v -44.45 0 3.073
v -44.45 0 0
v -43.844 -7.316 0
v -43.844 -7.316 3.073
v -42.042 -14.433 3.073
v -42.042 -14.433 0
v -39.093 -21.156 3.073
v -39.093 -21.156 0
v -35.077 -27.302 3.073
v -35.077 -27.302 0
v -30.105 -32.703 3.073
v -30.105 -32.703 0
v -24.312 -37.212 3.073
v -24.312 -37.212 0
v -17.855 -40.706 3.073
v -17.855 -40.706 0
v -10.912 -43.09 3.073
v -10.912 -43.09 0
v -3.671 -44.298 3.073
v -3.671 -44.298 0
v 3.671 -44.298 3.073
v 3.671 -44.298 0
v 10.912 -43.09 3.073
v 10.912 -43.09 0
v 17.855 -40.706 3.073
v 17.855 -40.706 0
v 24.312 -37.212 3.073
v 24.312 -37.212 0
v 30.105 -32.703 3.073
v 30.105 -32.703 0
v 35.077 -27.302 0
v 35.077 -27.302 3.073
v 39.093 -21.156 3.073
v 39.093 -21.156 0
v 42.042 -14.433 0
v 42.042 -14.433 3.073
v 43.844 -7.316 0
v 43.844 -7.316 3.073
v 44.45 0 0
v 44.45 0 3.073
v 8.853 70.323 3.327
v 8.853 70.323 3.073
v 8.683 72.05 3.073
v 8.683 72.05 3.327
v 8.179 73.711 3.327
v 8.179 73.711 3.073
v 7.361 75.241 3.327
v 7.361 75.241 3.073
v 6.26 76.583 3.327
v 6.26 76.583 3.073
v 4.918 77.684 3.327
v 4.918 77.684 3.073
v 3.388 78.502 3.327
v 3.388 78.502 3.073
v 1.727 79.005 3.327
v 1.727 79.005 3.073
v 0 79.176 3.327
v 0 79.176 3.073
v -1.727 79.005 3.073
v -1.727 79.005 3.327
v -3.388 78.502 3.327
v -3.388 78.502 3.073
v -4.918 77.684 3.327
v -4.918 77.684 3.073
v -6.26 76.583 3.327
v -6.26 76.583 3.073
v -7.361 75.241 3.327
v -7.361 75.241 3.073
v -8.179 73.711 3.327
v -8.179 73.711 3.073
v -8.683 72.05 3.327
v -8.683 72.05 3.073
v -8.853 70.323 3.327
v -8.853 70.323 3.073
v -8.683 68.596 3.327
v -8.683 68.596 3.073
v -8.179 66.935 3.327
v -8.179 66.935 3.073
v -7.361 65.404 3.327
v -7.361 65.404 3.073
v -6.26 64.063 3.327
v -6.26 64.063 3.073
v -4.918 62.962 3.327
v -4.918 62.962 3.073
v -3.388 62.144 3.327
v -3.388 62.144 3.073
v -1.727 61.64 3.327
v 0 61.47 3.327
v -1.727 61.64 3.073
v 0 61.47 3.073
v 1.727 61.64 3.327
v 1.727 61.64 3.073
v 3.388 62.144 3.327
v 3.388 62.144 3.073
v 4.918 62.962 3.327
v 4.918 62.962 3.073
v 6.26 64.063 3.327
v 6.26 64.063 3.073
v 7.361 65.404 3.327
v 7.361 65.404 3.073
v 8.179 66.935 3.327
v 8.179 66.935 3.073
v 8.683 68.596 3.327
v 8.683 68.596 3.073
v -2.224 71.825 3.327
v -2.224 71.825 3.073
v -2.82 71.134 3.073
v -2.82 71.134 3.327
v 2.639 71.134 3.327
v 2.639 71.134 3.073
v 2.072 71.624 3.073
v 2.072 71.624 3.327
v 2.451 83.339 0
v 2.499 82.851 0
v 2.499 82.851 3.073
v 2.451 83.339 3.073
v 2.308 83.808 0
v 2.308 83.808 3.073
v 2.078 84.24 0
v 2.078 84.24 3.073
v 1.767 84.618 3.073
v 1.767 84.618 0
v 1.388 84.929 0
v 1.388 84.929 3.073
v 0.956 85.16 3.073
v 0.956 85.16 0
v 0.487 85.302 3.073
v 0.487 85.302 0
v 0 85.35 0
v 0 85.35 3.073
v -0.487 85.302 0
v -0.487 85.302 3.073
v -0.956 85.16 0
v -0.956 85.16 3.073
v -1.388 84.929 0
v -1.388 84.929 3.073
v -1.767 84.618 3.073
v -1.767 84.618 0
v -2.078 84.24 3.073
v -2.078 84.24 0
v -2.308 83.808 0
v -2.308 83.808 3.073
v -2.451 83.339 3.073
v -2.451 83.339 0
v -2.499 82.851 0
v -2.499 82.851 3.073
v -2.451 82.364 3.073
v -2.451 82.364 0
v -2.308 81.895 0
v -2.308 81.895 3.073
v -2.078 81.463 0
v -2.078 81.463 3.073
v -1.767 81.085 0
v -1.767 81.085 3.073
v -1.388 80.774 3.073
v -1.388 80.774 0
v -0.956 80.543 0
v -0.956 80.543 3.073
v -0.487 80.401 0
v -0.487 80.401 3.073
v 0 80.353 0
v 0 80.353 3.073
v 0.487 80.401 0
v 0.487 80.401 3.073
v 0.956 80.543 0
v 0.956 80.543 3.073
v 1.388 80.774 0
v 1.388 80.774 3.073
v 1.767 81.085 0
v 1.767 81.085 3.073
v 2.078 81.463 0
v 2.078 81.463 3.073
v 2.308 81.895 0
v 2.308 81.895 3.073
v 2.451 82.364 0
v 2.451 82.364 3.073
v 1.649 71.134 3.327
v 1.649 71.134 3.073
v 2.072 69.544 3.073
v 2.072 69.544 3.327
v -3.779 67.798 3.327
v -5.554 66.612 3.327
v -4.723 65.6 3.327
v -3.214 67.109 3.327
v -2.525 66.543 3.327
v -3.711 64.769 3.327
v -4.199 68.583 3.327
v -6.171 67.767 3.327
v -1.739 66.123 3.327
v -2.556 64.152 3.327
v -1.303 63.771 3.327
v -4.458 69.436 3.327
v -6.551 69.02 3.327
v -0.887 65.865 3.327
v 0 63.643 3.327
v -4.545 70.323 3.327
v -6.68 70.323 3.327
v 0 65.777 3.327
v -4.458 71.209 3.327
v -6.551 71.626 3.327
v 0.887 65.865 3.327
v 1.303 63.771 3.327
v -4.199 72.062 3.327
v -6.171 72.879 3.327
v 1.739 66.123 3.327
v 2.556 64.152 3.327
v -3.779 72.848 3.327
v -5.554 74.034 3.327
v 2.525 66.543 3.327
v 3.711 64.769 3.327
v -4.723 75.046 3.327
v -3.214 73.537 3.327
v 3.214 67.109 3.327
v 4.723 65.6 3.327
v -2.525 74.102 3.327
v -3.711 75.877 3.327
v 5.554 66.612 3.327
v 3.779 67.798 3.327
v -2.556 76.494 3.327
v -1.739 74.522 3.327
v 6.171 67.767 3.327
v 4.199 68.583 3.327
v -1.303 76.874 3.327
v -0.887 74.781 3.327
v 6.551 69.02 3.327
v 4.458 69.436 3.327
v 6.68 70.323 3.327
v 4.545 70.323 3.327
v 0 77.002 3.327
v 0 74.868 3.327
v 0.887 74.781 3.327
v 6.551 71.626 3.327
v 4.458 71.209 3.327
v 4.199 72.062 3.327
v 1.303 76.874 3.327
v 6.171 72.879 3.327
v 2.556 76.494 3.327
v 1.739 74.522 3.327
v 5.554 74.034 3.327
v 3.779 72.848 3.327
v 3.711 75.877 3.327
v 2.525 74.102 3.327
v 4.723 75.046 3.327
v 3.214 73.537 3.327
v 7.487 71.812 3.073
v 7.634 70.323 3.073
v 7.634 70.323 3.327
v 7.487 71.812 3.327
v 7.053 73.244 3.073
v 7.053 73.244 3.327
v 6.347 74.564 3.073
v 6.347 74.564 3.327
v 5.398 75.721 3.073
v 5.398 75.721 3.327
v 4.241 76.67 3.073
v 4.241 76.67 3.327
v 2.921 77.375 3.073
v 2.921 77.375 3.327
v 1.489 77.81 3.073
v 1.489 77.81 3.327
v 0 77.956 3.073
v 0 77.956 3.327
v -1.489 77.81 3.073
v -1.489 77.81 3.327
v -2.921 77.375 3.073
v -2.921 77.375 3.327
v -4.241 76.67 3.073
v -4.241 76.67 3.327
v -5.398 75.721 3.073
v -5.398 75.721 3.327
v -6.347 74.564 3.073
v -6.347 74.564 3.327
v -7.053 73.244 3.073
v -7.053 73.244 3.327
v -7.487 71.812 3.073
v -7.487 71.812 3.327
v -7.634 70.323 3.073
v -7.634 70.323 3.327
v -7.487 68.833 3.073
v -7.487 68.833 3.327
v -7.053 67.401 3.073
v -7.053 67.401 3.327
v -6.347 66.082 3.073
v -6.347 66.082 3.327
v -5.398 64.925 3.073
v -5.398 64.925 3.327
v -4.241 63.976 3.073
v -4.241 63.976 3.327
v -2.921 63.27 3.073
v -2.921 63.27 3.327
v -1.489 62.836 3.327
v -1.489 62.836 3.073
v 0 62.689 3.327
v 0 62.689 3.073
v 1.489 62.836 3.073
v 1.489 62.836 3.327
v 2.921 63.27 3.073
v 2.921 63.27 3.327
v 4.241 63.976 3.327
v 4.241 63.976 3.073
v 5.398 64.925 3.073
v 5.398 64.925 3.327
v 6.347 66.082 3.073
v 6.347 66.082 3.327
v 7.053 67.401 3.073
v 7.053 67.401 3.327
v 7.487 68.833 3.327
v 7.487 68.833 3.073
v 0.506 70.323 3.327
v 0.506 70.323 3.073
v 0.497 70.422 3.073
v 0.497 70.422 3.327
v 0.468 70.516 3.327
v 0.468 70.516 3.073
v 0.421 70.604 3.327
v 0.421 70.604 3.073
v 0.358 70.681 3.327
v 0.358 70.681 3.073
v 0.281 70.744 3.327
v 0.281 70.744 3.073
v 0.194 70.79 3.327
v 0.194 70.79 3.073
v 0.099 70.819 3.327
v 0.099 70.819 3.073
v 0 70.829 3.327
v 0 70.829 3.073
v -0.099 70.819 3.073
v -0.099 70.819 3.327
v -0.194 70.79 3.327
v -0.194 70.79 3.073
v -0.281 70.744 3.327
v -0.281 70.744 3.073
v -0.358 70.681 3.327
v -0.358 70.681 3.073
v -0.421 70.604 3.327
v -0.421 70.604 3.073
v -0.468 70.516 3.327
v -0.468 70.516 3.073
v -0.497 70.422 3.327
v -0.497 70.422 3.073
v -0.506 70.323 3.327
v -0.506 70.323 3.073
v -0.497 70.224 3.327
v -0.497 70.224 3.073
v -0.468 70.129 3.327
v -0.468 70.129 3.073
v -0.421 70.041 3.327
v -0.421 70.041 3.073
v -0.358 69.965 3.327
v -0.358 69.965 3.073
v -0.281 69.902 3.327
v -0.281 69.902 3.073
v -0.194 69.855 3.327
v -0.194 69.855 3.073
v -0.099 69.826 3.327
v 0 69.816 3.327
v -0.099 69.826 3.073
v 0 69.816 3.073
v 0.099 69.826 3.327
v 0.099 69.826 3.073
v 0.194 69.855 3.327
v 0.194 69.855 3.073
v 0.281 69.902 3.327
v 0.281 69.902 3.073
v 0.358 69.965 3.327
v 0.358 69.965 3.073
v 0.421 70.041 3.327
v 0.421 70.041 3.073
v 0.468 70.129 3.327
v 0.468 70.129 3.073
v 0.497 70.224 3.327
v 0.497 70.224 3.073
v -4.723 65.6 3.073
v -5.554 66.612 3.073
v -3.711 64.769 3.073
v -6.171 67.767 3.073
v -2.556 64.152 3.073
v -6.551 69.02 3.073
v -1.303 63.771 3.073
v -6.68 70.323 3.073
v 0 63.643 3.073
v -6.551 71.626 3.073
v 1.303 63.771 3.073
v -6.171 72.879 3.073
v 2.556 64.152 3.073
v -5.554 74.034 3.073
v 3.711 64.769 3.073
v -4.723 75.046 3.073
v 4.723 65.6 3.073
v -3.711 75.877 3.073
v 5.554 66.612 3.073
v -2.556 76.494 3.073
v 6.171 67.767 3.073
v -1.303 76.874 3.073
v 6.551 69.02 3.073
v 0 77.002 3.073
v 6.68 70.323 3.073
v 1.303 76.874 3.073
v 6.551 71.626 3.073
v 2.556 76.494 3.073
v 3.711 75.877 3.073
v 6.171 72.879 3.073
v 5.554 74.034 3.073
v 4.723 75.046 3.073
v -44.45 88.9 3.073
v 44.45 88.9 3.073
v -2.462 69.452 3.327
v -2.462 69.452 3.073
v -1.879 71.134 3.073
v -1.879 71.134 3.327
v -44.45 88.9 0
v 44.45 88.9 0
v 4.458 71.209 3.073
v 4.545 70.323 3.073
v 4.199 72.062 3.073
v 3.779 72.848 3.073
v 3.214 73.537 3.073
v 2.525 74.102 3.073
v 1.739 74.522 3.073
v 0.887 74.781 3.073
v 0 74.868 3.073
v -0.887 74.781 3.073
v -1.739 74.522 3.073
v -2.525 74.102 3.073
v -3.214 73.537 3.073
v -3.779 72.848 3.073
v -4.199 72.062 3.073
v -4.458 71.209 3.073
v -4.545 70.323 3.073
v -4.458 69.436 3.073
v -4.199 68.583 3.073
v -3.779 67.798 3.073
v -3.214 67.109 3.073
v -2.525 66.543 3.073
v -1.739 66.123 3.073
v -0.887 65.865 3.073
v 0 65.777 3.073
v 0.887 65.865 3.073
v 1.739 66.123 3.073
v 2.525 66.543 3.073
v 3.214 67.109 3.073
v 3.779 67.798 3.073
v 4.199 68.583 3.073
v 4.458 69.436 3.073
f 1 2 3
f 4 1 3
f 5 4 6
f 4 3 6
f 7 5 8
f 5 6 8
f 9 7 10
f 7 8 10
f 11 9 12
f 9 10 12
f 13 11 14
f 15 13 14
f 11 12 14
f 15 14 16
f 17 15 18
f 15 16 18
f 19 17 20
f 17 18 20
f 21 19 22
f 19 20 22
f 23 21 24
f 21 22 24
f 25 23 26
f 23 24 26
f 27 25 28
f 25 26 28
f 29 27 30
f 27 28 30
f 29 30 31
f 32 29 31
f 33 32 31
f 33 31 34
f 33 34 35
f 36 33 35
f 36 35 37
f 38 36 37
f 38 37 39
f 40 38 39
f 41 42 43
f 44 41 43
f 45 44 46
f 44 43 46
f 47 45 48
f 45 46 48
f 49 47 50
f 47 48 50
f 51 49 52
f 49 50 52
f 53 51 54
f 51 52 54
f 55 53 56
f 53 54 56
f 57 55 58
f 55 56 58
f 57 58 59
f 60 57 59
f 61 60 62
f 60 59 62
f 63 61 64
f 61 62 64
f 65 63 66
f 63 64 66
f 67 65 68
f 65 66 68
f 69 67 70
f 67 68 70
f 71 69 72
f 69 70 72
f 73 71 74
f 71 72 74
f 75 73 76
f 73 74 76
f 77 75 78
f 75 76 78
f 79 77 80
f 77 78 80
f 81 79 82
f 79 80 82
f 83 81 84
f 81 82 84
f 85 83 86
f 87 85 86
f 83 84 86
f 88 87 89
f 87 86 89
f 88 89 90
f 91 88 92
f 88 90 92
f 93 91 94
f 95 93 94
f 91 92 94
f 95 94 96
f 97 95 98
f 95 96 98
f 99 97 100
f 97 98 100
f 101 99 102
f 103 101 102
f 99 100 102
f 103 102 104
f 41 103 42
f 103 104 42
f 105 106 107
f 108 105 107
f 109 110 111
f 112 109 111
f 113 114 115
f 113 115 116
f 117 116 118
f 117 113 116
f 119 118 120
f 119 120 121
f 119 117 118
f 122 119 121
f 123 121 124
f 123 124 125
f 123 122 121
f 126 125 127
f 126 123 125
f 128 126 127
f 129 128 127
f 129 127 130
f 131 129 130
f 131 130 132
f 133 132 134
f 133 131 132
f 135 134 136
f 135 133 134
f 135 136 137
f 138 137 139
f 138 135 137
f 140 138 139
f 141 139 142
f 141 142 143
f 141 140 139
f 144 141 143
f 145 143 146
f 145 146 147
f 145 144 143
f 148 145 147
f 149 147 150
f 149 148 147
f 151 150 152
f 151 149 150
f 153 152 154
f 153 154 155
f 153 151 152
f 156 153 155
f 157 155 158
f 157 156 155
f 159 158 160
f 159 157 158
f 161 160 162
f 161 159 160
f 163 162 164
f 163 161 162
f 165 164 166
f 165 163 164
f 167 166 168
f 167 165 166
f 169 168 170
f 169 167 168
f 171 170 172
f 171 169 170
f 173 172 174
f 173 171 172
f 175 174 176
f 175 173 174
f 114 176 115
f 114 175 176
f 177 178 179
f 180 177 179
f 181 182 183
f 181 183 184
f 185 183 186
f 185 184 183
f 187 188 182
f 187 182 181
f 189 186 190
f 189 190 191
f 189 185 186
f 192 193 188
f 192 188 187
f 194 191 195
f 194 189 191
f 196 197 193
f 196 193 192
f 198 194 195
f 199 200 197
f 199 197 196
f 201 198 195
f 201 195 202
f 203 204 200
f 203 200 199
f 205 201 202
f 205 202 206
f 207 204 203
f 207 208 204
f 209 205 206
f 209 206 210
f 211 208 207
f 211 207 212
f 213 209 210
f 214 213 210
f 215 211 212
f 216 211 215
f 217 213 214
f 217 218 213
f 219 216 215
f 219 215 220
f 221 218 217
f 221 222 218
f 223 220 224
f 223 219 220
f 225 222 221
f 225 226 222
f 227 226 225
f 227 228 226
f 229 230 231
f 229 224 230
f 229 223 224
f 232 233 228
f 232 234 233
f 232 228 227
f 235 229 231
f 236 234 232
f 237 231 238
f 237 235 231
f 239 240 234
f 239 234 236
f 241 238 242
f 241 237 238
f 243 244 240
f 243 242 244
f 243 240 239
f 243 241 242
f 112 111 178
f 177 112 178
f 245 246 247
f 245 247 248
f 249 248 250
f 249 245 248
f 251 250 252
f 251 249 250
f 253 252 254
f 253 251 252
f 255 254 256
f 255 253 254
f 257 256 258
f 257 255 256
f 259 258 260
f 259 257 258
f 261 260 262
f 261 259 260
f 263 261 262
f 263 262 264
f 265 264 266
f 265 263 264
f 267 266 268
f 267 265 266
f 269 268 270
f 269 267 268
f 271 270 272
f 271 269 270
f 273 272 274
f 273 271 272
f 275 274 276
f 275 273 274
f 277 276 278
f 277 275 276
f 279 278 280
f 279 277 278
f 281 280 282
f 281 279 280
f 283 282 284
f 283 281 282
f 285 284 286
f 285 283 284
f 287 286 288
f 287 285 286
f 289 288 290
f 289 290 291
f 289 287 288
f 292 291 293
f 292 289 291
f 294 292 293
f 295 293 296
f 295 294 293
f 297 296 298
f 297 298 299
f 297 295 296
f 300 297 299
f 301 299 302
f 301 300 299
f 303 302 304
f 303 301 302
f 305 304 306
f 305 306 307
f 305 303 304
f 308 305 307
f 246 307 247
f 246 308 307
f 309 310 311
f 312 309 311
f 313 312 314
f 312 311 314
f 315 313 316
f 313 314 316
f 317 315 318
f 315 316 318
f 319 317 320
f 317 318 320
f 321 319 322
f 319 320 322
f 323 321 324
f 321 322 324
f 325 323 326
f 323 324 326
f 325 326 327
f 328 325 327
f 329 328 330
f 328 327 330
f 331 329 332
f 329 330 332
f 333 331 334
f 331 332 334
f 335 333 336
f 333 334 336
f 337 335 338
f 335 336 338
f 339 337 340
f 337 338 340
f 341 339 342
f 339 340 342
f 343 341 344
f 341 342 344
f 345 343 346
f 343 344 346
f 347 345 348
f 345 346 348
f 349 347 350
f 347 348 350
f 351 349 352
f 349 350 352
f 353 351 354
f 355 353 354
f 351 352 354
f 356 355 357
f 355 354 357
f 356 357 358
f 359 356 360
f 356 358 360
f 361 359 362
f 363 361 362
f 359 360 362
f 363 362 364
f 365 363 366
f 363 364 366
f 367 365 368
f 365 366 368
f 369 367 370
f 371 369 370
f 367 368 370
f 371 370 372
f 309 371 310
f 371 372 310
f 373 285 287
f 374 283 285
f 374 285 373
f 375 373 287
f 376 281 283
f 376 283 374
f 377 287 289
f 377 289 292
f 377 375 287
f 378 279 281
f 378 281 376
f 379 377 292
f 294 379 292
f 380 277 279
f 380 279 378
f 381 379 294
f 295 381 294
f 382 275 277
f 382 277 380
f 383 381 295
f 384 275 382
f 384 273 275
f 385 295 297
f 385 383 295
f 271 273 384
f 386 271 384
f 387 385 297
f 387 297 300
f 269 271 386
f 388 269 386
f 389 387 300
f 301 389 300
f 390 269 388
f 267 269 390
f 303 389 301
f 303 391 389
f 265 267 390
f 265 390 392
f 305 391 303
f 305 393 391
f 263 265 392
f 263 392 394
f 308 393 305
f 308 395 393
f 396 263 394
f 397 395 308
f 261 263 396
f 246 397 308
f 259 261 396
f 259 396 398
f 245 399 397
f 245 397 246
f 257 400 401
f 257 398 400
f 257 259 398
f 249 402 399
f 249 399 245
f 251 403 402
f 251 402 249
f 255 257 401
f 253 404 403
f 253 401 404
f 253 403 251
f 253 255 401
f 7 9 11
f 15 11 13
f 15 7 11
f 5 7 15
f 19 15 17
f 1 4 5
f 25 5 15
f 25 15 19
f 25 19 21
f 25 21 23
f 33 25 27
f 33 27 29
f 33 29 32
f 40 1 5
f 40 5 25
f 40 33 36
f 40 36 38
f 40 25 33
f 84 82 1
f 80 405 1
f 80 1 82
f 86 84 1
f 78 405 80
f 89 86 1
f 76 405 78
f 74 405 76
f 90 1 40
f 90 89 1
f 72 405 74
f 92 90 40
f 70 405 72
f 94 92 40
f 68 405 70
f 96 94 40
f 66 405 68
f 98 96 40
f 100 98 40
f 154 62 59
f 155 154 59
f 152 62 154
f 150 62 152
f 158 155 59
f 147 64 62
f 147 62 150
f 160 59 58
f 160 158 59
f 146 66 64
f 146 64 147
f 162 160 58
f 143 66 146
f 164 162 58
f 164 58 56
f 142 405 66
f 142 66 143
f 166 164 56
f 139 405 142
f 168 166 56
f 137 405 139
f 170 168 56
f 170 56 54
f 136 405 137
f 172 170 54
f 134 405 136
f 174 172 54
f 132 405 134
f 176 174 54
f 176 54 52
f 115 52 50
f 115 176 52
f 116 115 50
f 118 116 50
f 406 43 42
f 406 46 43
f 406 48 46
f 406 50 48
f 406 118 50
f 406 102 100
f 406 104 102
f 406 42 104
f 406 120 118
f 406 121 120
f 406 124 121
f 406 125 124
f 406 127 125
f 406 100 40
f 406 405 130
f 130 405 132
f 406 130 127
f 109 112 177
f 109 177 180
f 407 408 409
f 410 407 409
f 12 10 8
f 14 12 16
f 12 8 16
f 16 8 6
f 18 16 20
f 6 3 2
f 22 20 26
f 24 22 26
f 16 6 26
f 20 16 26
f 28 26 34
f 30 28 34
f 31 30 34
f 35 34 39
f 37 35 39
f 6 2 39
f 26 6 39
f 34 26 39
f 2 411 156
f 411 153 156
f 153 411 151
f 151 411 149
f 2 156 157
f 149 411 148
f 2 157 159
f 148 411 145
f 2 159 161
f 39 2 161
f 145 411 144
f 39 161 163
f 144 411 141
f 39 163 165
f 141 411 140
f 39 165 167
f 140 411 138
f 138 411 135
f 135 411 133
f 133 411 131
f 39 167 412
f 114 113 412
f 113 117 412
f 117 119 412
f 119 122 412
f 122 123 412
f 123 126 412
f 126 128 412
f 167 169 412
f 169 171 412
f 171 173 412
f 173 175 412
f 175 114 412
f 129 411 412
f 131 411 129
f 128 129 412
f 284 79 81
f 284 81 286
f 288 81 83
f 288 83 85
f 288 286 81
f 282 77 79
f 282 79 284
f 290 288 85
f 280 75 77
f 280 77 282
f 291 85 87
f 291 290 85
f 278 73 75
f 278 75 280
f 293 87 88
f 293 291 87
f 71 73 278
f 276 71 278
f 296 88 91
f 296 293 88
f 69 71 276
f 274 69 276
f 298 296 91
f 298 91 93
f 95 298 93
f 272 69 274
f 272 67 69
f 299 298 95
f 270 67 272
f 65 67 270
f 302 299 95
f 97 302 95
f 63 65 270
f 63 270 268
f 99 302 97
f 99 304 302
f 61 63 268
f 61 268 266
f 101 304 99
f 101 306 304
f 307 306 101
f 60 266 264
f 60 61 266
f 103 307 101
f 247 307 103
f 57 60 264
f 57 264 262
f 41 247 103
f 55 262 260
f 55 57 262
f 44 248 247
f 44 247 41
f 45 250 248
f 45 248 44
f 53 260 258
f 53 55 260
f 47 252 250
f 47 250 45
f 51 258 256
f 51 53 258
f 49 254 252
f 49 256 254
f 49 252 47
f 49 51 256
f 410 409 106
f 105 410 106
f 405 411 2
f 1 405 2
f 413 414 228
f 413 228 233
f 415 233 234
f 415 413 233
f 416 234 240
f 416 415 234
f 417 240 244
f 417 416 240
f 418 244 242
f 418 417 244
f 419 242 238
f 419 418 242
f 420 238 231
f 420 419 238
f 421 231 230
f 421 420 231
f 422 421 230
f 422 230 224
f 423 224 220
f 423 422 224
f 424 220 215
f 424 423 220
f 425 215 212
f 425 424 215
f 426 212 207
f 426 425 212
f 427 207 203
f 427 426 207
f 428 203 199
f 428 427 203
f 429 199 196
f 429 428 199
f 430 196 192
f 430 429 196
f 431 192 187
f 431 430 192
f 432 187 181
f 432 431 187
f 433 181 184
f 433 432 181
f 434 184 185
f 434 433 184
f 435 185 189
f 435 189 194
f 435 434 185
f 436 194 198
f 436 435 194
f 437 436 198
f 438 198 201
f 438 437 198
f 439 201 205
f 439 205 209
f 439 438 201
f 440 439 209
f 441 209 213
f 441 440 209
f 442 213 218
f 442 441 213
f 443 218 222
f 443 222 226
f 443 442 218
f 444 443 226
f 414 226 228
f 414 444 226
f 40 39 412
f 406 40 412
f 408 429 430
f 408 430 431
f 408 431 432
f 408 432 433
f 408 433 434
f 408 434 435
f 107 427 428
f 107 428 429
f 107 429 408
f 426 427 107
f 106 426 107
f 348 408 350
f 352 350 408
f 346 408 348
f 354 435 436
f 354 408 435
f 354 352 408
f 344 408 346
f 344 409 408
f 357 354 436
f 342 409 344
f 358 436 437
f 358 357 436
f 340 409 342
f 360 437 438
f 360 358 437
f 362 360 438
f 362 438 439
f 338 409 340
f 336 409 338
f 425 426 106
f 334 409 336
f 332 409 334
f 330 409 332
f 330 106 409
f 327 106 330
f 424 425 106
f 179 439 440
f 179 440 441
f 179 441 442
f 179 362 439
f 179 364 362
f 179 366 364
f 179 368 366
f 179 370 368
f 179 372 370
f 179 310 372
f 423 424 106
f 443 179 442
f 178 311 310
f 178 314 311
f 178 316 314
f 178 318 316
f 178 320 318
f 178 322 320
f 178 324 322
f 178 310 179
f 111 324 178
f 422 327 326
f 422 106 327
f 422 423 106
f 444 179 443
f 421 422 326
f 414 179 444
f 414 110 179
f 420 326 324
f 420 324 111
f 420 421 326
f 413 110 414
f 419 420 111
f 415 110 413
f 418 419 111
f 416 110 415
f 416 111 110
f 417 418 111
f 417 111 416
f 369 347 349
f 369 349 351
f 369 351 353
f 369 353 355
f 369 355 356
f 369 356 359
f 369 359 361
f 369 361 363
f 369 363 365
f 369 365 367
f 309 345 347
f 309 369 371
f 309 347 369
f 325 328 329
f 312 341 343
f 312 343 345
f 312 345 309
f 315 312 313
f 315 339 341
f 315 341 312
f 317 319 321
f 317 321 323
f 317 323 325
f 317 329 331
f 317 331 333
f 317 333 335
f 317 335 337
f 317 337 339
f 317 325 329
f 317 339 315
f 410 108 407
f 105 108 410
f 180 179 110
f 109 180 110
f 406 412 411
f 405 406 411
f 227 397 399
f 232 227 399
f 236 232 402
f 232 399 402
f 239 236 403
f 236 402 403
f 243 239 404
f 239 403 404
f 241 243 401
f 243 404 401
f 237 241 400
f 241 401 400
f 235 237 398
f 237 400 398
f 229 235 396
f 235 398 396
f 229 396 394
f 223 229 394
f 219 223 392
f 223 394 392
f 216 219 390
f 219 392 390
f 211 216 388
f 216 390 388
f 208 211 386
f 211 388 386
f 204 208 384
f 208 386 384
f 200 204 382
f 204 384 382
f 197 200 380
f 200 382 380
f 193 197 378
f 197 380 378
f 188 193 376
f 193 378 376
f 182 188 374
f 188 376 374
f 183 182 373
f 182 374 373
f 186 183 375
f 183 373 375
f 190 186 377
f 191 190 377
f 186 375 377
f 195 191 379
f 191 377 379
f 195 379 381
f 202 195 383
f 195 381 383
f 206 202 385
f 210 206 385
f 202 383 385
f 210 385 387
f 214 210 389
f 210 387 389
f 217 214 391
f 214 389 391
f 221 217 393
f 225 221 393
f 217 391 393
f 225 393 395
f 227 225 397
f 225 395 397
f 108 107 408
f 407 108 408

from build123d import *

# Parameters (mm, degrees)
F0_R     = 2.4986506911
F1_DEPTH = 3.0734
F2_R     = 8.8528062314
F2_R_2   = 7.6336843155
F2_R_3   = 6.679620884
F2_R_4   = 4.5453115006
F2_R_5   = 0.5062861641
F3_DEPTH = 0.254


with BuildPart() as f1:
    # F0 (on Top) → F1 (new body)
    with BuildSketch(Plane.XY):
        with BuildLine():
            Line((-44.45, 88.9), (-44.45, 0))
            ThreePointArc((-44.45, 0), (0, -44.45), (44.45, 0))
            Line((44.45, 0), (44.45, 88.9))
            Line((44.45, 88.9), (-44.45, 88.9))
        make_face()
        with Locations((0, 82.8513503075)):
            Circle(F0_R, mode=Mode.SUBTRACT)
    extrude(amount=F1_DEPTH)

    # F2 (on face) → F3 (join)
    with BuildSketch(Plane.XY.offset(3.0734)):
        with Locations((0, 70.3227519989)):
            Circle(F2_R)
        with Locations((0, 70.3227519989)):
            Circle(F2_R_2, mode=Mode.SUBTRACT)
        with Locations((0, 70.3227519989)):
            Circle(F2_R_3)
        with Locations((0, 70.3227519989)):
            Circle(F2_R_4, mode=Mode.SUBTRACT)
        Polygon((-2.223612275, 71.8253105879), (-2.8203756083, 71.1344004551), (-2.4623177014, 69.4515183568), (-1.8788158195, 71.1344004551), align=None)
        Polygon((2.0716317148, 71.6240334723), (1.6487184912, 71.1344004551), (2.0716317148, 69.544352591), (2.6385103986, 71.1344004551), align=None)
        with Locations((0, 70.3227519989)):
            Circle(F2_R_5)
    extrude(amount=F3_DEPTH)


solid = f1.part
